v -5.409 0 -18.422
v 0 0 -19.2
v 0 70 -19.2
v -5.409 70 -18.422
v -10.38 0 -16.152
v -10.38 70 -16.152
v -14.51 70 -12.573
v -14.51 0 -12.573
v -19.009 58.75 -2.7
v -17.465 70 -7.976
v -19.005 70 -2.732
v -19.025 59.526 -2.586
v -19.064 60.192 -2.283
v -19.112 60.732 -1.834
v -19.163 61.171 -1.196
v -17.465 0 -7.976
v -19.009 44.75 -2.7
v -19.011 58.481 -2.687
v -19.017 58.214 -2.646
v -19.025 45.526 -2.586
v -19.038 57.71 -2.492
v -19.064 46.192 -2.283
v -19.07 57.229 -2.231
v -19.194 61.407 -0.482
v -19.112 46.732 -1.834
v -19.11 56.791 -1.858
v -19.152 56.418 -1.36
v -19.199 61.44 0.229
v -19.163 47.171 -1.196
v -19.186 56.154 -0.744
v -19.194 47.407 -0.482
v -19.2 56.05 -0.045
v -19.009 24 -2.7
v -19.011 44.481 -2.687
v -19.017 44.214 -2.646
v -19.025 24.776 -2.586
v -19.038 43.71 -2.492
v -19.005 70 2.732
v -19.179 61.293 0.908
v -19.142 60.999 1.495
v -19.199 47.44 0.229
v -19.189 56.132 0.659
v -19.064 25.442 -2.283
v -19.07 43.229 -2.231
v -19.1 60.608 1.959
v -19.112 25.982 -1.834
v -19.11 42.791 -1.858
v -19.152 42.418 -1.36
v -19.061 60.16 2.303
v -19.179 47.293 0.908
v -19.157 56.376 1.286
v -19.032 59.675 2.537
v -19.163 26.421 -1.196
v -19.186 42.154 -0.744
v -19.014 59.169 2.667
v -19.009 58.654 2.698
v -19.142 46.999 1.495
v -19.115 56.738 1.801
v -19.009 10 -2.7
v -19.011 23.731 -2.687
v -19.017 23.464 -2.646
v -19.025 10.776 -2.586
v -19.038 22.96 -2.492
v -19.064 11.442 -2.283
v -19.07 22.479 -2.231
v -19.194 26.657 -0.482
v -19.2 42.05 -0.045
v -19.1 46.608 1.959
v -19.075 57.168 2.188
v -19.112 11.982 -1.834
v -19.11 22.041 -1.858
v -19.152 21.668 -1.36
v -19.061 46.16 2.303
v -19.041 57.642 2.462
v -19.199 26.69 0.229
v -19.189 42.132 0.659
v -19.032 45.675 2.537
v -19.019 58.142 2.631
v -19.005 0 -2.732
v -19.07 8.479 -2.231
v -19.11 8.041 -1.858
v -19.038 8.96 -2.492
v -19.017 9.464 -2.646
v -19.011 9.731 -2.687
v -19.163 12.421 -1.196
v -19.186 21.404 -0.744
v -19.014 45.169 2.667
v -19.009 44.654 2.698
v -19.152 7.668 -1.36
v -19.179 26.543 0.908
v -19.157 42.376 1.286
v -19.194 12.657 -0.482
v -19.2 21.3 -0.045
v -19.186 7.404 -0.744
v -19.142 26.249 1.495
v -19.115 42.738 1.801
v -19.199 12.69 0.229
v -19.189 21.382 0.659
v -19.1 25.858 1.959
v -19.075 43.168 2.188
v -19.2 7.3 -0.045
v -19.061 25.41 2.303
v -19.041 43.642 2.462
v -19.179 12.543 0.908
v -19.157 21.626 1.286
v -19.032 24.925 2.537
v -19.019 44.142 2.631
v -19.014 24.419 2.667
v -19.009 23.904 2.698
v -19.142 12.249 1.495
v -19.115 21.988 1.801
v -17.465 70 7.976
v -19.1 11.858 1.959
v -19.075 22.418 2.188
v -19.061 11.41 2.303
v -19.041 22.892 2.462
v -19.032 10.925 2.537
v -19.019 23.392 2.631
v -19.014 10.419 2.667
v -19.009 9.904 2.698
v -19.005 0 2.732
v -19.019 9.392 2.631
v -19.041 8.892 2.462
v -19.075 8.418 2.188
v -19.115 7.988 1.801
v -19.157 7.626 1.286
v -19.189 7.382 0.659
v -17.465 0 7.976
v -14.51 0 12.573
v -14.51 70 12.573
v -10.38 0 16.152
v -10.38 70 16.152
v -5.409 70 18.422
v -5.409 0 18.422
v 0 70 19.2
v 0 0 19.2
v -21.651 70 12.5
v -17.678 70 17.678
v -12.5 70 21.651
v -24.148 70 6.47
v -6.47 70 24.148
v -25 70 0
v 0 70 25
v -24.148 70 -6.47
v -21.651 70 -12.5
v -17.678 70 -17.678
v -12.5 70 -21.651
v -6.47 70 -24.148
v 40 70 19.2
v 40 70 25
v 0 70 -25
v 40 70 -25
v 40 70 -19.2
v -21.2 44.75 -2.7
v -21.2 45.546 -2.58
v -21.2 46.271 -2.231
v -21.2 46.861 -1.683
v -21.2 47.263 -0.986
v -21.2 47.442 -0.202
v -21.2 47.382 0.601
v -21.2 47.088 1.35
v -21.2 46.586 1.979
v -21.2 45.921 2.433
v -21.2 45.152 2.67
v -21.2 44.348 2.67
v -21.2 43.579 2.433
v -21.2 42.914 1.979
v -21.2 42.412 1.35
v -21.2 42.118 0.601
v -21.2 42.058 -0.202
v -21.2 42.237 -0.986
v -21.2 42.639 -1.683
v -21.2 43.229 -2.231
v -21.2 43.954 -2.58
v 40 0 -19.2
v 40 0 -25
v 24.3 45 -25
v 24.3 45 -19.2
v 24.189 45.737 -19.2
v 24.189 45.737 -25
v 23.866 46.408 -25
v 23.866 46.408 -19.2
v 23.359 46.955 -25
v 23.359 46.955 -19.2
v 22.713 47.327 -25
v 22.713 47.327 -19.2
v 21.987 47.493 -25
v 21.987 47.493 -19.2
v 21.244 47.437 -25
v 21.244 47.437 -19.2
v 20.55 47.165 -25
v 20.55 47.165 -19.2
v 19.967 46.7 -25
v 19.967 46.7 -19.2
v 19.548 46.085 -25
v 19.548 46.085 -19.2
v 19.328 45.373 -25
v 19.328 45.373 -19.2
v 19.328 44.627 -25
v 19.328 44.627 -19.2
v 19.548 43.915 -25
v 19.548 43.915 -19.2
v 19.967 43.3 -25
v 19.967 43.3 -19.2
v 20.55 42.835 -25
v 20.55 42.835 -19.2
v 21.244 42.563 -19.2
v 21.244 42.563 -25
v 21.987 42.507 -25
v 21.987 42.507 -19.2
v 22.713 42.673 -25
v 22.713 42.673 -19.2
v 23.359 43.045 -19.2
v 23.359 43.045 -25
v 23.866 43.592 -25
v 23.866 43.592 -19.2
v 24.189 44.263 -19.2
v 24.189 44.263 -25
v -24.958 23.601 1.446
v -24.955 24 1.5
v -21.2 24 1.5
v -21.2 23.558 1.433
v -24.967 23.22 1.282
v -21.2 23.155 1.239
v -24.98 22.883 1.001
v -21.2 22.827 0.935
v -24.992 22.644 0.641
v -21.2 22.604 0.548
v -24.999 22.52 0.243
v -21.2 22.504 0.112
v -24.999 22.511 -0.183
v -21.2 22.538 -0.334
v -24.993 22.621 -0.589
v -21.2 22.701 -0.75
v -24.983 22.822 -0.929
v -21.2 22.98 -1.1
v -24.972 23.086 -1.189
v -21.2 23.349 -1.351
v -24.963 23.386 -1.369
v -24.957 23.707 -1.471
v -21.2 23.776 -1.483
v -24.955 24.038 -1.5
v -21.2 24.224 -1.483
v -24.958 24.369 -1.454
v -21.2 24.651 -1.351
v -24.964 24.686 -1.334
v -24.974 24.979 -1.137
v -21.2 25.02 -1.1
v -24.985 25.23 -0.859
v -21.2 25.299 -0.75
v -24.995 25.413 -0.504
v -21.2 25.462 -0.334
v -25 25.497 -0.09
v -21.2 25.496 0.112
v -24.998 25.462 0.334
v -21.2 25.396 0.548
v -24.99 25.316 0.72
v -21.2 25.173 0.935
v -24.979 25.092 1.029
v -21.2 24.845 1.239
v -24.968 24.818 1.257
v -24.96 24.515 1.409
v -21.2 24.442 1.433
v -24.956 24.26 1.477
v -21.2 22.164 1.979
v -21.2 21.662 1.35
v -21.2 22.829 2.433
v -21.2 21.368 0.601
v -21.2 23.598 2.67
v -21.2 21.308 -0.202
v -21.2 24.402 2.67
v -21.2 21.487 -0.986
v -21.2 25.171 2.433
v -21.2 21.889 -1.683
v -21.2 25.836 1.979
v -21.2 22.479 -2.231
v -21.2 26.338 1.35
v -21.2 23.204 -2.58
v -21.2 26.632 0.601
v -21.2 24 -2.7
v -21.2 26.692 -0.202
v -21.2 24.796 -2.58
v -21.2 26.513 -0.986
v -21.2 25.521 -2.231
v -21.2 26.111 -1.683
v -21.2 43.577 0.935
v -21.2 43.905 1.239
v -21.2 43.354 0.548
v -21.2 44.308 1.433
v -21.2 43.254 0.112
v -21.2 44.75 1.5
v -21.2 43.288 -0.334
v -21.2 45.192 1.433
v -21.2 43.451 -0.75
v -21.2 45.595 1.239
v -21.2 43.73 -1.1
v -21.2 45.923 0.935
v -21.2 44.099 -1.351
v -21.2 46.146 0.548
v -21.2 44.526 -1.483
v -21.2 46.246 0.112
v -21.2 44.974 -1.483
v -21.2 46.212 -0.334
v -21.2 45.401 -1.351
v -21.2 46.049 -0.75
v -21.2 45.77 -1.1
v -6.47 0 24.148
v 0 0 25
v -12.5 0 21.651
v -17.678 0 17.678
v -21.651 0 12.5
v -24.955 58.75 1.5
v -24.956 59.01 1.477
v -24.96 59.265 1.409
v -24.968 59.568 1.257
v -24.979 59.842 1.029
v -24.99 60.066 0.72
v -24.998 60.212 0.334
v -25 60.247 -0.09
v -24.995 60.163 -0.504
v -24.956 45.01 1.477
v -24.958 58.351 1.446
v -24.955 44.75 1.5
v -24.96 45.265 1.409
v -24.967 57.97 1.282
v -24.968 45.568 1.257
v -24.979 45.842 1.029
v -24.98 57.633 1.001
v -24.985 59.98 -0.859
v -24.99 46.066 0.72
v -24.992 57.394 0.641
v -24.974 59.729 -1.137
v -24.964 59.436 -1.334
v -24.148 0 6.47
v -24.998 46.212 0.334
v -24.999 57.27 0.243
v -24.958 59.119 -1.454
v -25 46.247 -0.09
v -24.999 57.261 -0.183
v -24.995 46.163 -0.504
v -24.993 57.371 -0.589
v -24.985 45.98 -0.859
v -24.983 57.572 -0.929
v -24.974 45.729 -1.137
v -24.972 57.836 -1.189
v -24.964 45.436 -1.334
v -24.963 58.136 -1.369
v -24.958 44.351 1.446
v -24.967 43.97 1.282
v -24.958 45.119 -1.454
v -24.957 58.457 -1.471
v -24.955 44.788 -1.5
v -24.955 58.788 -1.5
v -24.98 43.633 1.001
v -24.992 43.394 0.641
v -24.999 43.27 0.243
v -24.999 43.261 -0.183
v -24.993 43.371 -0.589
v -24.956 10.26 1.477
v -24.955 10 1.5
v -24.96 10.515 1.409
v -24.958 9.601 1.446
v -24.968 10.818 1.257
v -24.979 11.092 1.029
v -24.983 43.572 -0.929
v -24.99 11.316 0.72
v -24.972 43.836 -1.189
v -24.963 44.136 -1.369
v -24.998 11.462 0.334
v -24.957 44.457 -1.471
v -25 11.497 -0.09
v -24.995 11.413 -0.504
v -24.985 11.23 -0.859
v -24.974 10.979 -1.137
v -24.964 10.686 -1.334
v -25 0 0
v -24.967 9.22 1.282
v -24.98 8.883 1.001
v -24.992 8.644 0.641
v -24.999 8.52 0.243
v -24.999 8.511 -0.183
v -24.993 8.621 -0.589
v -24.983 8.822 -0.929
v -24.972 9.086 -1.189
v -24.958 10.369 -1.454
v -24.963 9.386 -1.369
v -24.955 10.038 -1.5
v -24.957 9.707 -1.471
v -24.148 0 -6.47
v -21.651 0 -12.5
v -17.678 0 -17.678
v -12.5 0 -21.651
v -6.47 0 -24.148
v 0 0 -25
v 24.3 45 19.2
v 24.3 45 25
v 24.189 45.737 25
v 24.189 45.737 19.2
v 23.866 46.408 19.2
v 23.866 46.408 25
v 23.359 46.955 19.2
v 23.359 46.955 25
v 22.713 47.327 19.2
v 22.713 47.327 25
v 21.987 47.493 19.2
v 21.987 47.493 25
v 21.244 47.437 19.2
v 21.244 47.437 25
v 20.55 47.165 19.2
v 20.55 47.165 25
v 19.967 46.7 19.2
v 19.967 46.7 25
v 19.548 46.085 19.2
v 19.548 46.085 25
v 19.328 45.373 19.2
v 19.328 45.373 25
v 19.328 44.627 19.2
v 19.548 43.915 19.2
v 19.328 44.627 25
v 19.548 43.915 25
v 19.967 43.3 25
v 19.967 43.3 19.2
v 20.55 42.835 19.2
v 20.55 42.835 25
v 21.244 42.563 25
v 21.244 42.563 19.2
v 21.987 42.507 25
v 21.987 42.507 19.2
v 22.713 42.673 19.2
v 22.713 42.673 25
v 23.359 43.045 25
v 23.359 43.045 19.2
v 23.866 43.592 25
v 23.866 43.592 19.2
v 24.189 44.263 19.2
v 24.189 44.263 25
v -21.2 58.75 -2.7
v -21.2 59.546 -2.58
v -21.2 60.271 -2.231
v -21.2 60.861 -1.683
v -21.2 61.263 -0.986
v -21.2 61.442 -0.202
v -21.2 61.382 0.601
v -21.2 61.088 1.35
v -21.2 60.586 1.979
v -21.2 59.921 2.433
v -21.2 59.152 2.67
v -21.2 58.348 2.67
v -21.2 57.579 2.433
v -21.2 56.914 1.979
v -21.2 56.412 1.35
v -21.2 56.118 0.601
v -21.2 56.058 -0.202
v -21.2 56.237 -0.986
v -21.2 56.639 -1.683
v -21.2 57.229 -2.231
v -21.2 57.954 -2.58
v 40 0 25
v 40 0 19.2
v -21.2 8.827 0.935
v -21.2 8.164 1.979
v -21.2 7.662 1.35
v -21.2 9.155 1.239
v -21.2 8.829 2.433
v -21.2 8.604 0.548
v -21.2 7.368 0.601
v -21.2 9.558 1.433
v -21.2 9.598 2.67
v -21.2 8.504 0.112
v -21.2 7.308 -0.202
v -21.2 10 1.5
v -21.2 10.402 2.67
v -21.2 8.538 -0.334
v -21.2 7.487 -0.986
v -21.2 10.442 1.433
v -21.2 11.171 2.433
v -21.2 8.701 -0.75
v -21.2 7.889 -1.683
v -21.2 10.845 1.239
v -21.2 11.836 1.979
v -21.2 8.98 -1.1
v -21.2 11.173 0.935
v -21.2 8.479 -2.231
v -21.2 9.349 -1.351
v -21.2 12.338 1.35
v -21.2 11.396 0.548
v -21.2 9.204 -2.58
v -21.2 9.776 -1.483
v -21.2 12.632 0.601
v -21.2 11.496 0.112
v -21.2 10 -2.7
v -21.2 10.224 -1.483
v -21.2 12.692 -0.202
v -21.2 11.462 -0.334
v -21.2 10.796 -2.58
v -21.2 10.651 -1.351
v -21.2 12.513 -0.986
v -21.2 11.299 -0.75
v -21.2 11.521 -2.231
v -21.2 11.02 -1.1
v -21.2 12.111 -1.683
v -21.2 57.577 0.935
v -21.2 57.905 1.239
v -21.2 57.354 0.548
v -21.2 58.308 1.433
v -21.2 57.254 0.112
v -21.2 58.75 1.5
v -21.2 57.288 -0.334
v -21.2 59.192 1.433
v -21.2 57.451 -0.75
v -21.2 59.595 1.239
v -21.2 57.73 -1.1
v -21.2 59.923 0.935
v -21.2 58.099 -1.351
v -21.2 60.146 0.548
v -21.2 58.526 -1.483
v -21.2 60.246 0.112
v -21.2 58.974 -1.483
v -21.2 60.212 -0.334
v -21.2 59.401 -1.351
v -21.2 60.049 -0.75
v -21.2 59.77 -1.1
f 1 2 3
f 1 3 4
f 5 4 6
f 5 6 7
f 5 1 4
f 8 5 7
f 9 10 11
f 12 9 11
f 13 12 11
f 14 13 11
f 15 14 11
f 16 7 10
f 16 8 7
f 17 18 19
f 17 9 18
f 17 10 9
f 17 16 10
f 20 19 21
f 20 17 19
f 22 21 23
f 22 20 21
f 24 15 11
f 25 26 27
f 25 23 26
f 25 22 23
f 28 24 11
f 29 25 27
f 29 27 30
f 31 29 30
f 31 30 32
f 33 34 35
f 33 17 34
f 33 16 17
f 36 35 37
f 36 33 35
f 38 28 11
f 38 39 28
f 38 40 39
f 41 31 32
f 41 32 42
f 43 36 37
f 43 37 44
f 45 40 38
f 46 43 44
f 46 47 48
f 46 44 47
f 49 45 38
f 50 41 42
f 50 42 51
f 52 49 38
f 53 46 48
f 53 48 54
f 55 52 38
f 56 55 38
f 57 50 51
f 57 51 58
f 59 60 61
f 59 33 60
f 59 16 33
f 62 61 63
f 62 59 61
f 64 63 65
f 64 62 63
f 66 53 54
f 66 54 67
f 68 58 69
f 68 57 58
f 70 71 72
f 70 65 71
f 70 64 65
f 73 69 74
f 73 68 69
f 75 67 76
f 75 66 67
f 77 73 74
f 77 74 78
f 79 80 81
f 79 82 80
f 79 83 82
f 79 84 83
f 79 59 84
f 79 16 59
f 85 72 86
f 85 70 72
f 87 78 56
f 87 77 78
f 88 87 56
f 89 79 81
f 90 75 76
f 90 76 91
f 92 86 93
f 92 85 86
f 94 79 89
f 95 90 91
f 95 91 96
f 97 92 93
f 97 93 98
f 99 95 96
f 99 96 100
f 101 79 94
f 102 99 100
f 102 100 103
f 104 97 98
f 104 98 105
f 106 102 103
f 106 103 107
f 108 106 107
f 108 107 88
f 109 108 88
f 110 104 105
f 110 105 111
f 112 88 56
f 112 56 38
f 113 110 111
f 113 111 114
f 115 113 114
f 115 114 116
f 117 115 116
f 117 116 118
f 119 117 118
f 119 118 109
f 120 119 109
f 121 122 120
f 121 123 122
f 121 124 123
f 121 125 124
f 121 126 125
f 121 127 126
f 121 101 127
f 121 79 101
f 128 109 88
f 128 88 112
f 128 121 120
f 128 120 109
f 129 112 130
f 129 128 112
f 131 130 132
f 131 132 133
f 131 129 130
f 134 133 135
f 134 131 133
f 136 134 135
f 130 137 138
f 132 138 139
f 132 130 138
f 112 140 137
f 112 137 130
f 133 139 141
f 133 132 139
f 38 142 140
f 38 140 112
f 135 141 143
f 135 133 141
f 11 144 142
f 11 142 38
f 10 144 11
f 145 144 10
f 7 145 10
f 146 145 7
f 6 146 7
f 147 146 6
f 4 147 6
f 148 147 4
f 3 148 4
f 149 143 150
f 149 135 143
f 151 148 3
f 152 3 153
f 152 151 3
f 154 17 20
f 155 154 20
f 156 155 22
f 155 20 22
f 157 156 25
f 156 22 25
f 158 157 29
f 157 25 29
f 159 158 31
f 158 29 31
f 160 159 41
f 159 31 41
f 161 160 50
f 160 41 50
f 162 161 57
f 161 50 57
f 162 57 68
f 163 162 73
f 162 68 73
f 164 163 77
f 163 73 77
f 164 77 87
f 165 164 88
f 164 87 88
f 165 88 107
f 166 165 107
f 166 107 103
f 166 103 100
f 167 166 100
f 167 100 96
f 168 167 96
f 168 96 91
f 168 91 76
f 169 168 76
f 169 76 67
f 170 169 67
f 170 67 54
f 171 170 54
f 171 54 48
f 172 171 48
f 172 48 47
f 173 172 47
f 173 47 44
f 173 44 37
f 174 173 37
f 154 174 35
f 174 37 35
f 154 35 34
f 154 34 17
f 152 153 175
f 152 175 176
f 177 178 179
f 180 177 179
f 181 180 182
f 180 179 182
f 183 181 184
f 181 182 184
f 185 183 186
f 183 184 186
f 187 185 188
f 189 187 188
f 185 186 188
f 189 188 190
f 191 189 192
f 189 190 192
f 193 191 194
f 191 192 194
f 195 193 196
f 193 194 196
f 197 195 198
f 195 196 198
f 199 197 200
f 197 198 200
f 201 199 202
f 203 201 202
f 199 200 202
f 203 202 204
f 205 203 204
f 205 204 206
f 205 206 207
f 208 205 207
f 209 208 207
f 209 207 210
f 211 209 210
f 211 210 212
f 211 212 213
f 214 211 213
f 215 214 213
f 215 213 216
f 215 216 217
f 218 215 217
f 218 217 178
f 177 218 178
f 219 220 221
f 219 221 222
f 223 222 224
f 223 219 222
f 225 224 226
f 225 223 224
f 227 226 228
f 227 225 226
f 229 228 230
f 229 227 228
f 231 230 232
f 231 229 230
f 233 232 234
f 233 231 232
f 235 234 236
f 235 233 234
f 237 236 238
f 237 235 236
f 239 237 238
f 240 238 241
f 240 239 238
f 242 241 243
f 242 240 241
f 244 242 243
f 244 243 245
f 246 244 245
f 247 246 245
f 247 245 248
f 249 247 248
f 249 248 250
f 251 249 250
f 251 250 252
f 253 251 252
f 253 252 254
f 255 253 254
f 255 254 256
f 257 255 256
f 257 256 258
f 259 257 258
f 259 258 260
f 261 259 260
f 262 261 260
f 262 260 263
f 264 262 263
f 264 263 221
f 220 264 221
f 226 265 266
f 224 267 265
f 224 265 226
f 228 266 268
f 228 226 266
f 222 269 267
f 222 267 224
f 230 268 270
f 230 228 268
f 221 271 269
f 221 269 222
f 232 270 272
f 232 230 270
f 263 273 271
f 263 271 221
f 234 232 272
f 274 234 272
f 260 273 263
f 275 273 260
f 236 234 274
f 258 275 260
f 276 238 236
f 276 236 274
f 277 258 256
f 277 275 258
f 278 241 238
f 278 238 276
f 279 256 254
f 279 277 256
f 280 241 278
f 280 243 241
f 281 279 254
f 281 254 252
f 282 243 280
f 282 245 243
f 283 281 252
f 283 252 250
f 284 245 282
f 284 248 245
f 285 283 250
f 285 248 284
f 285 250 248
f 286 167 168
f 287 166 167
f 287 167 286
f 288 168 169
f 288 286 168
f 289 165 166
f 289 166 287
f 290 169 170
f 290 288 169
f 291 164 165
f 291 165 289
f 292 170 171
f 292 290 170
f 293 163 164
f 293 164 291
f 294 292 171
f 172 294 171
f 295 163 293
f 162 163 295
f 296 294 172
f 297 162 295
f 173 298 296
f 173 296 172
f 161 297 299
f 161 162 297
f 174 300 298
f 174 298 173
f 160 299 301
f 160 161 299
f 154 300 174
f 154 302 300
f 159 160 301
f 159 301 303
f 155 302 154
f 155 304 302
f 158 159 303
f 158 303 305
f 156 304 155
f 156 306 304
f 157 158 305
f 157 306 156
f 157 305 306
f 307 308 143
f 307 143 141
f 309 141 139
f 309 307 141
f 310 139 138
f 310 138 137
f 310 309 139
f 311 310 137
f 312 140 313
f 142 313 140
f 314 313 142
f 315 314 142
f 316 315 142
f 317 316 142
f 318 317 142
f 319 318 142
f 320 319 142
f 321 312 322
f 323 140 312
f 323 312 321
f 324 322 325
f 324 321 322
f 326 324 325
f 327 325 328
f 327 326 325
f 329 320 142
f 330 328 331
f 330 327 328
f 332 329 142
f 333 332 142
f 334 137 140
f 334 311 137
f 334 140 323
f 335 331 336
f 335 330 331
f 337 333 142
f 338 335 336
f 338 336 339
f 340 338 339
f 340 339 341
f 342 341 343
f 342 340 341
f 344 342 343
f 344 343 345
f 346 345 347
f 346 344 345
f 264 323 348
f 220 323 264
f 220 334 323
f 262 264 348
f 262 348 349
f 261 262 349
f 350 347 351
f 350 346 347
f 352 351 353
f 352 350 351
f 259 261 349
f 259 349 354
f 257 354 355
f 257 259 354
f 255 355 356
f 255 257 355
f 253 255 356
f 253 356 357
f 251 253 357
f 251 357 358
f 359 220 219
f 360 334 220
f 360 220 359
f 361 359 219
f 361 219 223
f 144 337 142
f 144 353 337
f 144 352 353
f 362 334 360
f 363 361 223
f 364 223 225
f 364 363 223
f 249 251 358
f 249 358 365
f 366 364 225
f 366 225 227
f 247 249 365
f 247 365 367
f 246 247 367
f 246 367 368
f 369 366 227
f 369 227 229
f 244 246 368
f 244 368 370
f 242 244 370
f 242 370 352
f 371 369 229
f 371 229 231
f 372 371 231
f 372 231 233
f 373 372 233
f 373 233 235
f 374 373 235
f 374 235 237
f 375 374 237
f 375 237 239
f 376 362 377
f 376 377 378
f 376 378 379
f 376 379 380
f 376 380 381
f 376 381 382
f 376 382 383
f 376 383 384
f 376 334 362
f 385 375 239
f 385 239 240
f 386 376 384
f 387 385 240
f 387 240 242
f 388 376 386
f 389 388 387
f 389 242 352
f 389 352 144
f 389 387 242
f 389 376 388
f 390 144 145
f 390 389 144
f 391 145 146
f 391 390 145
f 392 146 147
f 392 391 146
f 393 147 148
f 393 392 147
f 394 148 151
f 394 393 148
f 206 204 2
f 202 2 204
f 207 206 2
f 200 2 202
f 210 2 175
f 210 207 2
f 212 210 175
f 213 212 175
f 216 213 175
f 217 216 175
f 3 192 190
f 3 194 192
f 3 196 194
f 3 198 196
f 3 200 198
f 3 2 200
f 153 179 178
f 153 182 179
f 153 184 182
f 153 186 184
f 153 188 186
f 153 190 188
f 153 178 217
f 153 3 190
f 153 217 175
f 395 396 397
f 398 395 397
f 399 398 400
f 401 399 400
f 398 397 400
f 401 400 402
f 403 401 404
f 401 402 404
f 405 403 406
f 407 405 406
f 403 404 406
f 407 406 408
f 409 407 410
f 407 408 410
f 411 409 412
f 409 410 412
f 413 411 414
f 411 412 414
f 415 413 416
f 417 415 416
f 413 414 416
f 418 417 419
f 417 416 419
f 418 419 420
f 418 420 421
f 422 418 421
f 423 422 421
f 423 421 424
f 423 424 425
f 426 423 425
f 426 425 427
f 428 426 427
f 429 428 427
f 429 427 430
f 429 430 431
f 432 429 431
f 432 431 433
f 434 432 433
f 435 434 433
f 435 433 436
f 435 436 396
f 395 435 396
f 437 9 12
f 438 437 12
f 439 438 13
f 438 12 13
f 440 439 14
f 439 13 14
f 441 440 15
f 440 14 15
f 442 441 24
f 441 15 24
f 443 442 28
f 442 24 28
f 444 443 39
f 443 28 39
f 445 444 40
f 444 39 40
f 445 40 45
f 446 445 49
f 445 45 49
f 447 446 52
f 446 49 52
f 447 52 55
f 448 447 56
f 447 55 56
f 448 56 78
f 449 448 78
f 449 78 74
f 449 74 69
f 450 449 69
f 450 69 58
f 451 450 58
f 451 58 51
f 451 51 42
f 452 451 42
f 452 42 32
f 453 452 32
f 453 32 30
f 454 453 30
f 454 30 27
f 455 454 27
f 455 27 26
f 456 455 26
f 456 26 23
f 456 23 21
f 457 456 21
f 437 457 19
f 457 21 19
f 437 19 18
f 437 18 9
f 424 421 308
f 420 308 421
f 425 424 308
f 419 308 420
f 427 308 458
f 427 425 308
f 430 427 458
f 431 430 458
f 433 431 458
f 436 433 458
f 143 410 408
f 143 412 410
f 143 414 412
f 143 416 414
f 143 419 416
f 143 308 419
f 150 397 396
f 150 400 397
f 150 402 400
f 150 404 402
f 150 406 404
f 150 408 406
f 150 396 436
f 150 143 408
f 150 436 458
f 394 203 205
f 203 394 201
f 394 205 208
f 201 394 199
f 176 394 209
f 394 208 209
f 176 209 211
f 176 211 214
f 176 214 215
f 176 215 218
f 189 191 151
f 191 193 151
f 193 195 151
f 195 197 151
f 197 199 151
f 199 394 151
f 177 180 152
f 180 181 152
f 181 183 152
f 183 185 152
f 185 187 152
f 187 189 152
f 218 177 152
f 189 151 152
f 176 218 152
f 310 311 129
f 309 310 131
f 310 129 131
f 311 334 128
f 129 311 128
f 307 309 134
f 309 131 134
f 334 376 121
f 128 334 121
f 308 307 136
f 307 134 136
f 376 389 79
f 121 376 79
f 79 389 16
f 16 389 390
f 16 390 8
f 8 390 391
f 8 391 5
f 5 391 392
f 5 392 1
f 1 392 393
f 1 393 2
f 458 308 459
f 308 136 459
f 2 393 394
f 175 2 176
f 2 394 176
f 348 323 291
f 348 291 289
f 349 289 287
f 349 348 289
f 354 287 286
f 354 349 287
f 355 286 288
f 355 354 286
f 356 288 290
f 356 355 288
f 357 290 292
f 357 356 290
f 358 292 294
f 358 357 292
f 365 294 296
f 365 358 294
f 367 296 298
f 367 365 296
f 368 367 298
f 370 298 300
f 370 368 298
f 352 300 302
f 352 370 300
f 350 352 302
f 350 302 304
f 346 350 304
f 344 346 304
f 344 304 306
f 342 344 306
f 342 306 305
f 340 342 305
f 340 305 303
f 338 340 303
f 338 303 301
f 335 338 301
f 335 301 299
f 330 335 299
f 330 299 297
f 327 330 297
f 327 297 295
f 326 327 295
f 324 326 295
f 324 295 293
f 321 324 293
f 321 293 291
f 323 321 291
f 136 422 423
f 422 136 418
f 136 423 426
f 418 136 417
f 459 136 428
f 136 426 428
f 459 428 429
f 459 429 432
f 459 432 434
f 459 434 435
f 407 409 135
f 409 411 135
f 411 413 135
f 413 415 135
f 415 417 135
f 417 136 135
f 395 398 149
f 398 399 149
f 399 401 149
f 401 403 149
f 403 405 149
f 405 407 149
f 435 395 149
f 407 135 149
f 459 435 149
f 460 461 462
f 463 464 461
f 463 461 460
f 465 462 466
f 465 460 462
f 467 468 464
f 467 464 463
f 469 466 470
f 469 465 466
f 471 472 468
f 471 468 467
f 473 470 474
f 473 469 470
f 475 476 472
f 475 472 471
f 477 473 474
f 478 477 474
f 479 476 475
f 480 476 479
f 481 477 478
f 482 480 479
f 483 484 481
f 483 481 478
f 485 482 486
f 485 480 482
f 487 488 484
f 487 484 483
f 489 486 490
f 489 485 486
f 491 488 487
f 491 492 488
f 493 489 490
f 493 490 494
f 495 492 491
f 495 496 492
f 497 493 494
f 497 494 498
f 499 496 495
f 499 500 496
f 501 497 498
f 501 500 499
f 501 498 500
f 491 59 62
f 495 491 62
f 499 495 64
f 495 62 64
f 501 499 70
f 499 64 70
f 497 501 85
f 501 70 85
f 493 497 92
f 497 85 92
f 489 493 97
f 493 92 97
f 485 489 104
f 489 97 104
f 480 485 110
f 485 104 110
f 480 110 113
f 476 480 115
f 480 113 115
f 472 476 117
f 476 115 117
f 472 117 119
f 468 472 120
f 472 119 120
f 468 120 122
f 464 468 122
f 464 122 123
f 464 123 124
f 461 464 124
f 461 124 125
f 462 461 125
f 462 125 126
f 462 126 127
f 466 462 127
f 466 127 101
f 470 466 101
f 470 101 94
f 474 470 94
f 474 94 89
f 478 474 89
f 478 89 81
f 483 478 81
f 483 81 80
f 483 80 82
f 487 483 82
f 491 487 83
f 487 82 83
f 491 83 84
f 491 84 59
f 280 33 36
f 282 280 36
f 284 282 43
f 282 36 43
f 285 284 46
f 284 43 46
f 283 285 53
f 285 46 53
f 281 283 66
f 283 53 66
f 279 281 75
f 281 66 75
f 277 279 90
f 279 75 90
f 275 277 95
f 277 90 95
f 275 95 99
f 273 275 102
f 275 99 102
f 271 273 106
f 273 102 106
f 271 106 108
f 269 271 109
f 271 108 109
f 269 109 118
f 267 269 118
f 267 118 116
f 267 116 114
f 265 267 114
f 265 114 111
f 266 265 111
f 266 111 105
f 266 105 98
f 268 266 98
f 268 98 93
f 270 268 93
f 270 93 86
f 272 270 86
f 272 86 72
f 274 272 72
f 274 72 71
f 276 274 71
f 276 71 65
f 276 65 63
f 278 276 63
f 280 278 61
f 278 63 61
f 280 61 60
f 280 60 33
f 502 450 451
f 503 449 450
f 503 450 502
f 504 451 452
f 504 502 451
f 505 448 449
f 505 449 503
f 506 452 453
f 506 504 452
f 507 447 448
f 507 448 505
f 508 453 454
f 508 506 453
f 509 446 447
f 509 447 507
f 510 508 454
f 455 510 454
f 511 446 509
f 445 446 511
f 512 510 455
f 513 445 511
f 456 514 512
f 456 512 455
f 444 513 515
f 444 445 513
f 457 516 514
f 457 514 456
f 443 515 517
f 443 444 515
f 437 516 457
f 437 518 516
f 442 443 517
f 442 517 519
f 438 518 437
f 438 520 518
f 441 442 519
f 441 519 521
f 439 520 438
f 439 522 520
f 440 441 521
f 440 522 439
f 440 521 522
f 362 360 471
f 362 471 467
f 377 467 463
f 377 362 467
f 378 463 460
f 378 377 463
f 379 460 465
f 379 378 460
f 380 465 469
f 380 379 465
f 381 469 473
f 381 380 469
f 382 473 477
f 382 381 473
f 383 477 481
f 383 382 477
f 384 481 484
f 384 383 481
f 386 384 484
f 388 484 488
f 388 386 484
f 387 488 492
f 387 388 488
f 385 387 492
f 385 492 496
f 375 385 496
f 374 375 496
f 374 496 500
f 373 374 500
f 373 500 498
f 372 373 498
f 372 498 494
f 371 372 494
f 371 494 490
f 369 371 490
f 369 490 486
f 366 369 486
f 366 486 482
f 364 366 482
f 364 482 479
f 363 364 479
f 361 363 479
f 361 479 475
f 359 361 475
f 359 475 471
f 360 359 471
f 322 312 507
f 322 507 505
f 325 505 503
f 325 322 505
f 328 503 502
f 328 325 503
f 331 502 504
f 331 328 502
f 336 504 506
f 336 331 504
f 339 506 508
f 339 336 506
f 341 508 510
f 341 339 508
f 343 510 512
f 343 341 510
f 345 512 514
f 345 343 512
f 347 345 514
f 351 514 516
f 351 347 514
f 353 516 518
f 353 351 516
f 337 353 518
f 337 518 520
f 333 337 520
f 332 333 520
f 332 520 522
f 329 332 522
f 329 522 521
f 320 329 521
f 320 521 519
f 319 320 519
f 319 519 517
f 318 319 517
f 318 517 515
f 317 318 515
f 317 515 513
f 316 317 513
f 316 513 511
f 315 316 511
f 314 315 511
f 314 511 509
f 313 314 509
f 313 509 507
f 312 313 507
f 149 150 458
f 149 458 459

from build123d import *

# Parameters (mm, degrees)
EXTRUDE_1_DEPTH          = 70
CUT_EXTRUDE_1_DEPTH      = 3
CUT_EXTRUDE_1_DEPTH_BACK = 79.421935707
SKETCH_2_R               = 1.5
SKETCH_6_R               = 2.7
SKETCH_6_R_2             = 1.5
CUT_EXTRUDE_3_DEPTH      = 21.2
SKETCH_7_W               = 40
SKETCH_7_H               = 5.8
EXTRUDE_2_DEPTH          = 70
CUT_EXTRUDE_4_REACH      = 96.868
SKETCH_8_R               = 2.5


with BuildPart() as part:
    # 草图1 → 凸台-拉伸1 (new body)
    with BuildSketch(Plane(origin=(0, 0, 0), x_dir=(1, 0, 0), z_dir=(0, 1, 0))):
        with BuildLine():
            Line((0, 25), (0, 19.2))
            ThreePointArc((0, 19.2), (-19.2, 0), (0, -19.2))
            Line((0, -19.2), (0, -25))
            ThreePointArc((0, -25), (-25, 0), (0, 25))
        make_face()
    extrude(amount=EXTRUDE_1_DEPTH)

    # 草图2 → 切除-拉伸1 (cut, two sides: drawn at the far end of the back side and taken through both)
    with BuildSketch(Plane(origin=(0, 0, 0), x_dir=(0, 0, -1), z_dir=(1, 0, 0)).offset(-CUT_EXTRUDE_1_DEPTH_BACK)):
        with Locations(Location((0, 58.75, 0), (0, 0, 180))):
            Circle(SKETCH_2_R)
        with Locations(Location((0, 44.75, 0), (0, 0, 180))):
            Circle(SKETCH_2_R)
        with Locations(Location((0, 24, 0), (0, 0, 180))):
            Circle(SKETCH_2_R)
        with Locations(Location((0, 10, 0), (0, 0, 180))):
            Circle(SKETCH_2_R)
    extrude(amount=CUT_EXTRUDE_1_DEPTH + CUT_EXTRUDE_1_DEPTH_BACK, mode=Mode.SUBTRACT)

    # 草图6 → 切除-拉伸3 (cut)
    # profile 1 of 4: a face of its own
    with BuildSketch(Plane(origin=(0, 0, 0), x_dir=(0, 0, -1), z_dir=(1, 0, 0))):
        with Locations((0, 58.75)):
            Circle(SKETCH_6_R)
        with Locations(Location((0, 58.75, 0), (0, 0, 180))):
            Circle(SKETCH_6_R_2, mode=Mode.SUBTRACT)
    # profile 2 of 4: a face of its own
    with BuildSketch(Plane(origin=(0, 0, 0), x_dir=(0, 0, -1), z_dir=(1, 0, 0))):
        with Locations((0, 44.75)):
            Circle(SKETCH_6_R)
        with Locations(Location((0, 44.75, 0), (0, 0, 180))):
            Circle(SKETCH_6_R_2, mode=Mode.SUBTRACT)
    # profile 3 of 4: a face of its own
    with BuildSketch(Plane(origin=(0, 0, 0), x_dir=(0, 0, -1), z_dir=(1, 0, 0))):
        with Locations((0, 24)):
            Circle(SKETCH_6_R)
        with Locations(Location((0, 24, 0), (0, 0, 180))):
            Circle(SKETCH_6_R_2, mode=Mode.SUBTRACT)
    # profile 4 of 4: a face of its own
    with BuildSketch(Plane(origin=(0, 0, 0), x_dir=(0, 0, -1), z_dir=(1, 0, 0))):
        with Locations((0, 10)):
            Circle(SKETCH_6_R)
        with Locations(Location((0, 10, 0), (0, 0, 180))):
            Circle(SKETCH_6_R_2, mode=Mode.SUBTRACT)
    extrude(amount=-CUT_EXTRUDE_3_DEPTH, mode=Mode.SUBTRACT)

    # 草图7 → 凸台-拉伸2 (add)
    with BuildSketch(Plane(origin=(0, 70, 0), x_dir=(1, 0, 0), z_dir=(0, 1, 0))):
        with Locations((20, 22.1)):
            Rectangle(SKETCH_7_W, SKETCH_7_H)
        with Locations((20, -22.1)):
            Rectangle(SKETCH_7_W, SKETCH_7_H)
    extrude(amount=-EXTRUDE_2_DEPTH)

    # 切除-拉伸4: up to this face of the body (flat: up to its plane)
    cut_extrude_4_end = Plane(part.part.faces().sort_by_distance((20, 35, -25))[0])
    # 草图8 → 切除-拉伸4 (cut, up to the picked face)
    with BuildSketch(Plane.XY.offset(25), mode=Mode.PRIVATE) as cut_extrude_4_sk1:
        with Locations((21.8, 45)):
            Circle(SKETCH_8_R)
    cut_extrude_4_tool1 = split(extrude(cut_extrude_4_sk1.sketch, amount=-CUT_EXTRUDE_4_REACH, mode=Mode.PRIVATE), bisect_by=cut_extrude_4_end, keep=Keep.BOTH, mode=Mode.PRIVATE)
    add(cut_extrude_4_tool1.solids().sort_by(Axis((21.8, 45, 25), (0, 0, -1)))[0], mode=Mode.SUBTRACT)


solid = part.part
